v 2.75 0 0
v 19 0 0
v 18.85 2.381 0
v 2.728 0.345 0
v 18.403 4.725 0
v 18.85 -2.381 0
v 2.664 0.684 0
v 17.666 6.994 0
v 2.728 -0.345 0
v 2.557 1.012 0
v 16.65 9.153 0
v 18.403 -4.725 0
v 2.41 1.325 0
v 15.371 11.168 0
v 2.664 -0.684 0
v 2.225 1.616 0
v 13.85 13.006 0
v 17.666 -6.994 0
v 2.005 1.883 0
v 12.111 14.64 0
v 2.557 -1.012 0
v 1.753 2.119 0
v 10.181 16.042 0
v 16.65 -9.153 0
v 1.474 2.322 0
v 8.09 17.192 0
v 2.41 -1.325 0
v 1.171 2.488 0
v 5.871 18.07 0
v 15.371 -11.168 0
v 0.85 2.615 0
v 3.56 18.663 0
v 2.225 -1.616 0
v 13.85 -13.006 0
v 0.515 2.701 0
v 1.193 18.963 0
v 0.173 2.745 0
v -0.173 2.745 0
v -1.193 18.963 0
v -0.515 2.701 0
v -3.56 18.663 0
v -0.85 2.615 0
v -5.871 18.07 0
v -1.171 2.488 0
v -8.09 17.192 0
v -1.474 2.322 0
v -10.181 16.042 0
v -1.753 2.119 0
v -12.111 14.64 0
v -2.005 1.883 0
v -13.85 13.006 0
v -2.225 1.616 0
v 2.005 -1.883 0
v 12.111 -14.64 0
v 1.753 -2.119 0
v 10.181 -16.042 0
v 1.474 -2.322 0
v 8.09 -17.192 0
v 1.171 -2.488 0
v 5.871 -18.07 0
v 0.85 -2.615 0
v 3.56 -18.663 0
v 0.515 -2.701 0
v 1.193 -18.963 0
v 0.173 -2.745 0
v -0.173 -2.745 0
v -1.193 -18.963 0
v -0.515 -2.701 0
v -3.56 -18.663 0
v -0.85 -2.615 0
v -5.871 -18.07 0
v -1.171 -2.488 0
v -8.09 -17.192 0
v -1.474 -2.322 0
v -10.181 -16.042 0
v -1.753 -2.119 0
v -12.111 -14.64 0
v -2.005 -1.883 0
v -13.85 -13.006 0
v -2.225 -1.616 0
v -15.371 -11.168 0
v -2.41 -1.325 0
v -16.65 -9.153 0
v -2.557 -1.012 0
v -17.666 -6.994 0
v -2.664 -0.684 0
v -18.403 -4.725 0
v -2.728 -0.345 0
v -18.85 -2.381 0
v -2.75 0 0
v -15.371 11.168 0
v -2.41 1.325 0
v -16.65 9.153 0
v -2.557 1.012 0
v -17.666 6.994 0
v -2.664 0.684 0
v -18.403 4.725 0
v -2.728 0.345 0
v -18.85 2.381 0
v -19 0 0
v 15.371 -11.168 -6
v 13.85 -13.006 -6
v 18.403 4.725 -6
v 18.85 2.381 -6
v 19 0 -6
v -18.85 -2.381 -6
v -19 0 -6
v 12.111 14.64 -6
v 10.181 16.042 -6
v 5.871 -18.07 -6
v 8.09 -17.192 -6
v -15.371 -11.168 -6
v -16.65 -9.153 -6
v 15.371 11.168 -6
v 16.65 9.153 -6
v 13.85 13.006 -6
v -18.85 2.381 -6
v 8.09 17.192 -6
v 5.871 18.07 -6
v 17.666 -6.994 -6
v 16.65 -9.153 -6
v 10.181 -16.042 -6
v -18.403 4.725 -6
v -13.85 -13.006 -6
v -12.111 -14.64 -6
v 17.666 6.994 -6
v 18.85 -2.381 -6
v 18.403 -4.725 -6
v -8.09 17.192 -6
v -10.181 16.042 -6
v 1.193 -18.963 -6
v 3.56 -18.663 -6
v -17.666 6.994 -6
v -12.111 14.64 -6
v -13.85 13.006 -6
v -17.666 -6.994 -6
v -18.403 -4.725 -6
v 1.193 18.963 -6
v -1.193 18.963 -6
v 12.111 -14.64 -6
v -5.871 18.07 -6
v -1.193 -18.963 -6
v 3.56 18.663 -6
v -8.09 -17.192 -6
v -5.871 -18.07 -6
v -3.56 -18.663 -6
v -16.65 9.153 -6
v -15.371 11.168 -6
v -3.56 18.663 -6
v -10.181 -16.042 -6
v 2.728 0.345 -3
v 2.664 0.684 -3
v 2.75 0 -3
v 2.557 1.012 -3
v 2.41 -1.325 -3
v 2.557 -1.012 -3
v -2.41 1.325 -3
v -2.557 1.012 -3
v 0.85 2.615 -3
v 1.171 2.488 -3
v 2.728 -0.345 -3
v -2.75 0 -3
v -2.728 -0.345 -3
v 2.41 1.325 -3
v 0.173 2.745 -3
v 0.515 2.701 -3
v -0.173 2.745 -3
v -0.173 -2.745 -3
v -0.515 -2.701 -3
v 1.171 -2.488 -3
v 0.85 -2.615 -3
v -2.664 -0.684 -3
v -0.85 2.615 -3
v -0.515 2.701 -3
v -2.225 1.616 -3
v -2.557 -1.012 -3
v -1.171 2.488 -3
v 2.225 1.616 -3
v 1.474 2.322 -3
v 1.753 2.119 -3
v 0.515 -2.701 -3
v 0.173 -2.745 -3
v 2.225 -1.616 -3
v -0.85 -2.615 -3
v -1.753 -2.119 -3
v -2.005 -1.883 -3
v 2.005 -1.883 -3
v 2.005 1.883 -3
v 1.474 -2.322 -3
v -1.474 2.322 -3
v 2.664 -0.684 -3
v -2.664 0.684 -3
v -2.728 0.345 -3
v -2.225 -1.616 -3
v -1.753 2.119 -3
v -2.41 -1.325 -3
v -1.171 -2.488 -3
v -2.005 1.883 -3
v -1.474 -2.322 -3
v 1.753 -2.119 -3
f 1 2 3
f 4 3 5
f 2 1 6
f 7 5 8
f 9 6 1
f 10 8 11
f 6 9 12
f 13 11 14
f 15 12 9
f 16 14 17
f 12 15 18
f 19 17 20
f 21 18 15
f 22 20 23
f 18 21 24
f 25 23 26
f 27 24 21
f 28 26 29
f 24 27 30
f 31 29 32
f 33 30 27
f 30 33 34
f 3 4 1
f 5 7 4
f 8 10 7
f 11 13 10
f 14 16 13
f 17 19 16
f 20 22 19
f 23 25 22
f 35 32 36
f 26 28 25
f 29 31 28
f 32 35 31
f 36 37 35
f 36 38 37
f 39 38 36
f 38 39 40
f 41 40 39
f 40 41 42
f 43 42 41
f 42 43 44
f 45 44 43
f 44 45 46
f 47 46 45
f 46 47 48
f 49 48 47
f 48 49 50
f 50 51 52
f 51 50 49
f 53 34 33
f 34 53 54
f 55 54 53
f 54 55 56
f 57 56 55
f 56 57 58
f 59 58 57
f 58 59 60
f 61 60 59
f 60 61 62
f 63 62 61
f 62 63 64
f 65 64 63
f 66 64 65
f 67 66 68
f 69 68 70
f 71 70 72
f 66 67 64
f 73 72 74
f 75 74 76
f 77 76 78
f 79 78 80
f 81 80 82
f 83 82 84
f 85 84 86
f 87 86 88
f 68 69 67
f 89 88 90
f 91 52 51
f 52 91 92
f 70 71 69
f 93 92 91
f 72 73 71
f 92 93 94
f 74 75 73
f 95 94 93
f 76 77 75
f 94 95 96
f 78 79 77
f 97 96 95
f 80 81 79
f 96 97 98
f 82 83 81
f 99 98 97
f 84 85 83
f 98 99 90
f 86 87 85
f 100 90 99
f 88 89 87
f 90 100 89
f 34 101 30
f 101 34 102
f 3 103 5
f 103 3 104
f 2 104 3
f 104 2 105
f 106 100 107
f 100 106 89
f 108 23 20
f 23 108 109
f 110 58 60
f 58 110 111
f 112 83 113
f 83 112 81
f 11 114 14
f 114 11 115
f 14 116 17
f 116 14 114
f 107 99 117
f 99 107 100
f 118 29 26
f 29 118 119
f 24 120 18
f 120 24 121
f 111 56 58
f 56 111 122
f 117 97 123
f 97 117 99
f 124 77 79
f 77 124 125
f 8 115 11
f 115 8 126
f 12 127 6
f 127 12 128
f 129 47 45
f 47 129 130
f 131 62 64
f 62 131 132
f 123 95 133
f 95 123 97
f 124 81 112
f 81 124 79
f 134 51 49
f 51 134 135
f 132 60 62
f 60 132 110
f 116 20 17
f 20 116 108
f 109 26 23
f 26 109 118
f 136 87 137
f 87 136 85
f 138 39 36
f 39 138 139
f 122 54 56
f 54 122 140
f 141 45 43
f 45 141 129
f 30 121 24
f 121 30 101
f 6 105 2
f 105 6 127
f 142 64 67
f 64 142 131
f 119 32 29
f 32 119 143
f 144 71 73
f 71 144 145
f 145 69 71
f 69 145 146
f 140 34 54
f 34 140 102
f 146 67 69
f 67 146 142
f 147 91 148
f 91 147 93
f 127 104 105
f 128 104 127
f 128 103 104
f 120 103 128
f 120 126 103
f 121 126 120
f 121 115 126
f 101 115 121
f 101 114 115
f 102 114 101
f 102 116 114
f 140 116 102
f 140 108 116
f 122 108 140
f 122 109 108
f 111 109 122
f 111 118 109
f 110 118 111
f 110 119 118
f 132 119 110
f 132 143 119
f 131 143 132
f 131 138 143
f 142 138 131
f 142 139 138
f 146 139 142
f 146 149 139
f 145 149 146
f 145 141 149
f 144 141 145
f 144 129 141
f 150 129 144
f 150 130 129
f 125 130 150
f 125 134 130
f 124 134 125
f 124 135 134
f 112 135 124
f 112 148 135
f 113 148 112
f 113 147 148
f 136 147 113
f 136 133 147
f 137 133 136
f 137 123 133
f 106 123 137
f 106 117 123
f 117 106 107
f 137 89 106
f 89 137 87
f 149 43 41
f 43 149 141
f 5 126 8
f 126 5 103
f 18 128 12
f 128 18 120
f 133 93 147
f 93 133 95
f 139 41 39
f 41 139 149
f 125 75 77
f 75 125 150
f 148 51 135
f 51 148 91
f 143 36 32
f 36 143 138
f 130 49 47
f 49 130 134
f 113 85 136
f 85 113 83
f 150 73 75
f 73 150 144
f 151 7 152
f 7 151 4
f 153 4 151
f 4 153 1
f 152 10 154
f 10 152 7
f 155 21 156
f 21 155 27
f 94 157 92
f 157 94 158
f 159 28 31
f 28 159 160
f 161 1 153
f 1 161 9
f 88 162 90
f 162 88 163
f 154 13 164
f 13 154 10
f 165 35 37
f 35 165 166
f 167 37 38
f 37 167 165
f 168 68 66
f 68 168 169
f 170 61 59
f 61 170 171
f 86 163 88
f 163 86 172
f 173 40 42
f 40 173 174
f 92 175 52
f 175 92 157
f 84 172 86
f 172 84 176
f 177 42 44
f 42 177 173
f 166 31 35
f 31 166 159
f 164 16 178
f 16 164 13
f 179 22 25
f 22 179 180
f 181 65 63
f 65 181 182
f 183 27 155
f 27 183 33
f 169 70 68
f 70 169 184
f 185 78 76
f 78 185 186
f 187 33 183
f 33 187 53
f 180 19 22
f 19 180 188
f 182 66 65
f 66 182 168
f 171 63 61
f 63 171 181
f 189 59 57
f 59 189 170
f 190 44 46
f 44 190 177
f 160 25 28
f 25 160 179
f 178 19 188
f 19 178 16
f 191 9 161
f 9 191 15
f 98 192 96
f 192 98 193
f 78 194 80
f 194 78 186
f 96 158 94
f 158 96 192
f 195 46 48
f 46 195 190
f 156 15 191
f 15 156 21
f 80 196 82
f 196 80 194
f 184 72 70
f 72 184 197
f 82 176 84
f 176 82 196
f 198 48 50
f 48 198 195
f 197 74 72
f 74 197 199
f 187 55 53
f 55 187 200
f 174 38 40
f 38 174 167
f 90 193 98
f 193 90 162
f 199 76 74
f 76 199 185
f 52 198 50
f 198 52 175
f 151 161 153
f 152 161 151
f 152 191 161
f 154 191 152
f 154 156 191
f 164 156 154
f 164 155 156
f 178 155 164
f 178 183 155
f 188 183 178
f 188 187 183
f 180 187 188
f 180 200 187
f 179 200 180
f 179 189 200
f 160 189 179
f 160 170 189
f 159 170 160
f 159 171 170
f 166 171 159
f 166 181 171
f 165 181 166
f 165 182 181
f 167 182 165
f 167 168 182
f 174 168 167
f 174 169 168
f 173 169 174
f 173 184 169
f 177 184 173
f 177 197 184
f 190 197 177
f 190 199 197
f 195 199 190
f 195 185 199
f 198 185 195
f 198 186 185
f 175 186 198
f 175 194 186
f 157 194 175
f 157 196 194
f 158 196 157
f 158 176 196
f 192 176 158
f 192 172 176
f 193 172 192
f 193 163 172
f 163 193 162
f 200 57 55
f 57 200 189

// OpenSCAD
$fn = 50;


difference() {
	union() {
		translate(v = [0, 0, -3.0000000000]) {
			cylinder(h = 3, r = 10.0000000000);
		}
		translate(v = [0, 0, -6.0000000000]) {
			cylinder(h = 6, r = 19.0000000000);
		}
	}
	union() {
		#translate(v = [0, 0, -3]) {
			cylinder(h = 3, r = 2.7500000000);
		}
	}
}
